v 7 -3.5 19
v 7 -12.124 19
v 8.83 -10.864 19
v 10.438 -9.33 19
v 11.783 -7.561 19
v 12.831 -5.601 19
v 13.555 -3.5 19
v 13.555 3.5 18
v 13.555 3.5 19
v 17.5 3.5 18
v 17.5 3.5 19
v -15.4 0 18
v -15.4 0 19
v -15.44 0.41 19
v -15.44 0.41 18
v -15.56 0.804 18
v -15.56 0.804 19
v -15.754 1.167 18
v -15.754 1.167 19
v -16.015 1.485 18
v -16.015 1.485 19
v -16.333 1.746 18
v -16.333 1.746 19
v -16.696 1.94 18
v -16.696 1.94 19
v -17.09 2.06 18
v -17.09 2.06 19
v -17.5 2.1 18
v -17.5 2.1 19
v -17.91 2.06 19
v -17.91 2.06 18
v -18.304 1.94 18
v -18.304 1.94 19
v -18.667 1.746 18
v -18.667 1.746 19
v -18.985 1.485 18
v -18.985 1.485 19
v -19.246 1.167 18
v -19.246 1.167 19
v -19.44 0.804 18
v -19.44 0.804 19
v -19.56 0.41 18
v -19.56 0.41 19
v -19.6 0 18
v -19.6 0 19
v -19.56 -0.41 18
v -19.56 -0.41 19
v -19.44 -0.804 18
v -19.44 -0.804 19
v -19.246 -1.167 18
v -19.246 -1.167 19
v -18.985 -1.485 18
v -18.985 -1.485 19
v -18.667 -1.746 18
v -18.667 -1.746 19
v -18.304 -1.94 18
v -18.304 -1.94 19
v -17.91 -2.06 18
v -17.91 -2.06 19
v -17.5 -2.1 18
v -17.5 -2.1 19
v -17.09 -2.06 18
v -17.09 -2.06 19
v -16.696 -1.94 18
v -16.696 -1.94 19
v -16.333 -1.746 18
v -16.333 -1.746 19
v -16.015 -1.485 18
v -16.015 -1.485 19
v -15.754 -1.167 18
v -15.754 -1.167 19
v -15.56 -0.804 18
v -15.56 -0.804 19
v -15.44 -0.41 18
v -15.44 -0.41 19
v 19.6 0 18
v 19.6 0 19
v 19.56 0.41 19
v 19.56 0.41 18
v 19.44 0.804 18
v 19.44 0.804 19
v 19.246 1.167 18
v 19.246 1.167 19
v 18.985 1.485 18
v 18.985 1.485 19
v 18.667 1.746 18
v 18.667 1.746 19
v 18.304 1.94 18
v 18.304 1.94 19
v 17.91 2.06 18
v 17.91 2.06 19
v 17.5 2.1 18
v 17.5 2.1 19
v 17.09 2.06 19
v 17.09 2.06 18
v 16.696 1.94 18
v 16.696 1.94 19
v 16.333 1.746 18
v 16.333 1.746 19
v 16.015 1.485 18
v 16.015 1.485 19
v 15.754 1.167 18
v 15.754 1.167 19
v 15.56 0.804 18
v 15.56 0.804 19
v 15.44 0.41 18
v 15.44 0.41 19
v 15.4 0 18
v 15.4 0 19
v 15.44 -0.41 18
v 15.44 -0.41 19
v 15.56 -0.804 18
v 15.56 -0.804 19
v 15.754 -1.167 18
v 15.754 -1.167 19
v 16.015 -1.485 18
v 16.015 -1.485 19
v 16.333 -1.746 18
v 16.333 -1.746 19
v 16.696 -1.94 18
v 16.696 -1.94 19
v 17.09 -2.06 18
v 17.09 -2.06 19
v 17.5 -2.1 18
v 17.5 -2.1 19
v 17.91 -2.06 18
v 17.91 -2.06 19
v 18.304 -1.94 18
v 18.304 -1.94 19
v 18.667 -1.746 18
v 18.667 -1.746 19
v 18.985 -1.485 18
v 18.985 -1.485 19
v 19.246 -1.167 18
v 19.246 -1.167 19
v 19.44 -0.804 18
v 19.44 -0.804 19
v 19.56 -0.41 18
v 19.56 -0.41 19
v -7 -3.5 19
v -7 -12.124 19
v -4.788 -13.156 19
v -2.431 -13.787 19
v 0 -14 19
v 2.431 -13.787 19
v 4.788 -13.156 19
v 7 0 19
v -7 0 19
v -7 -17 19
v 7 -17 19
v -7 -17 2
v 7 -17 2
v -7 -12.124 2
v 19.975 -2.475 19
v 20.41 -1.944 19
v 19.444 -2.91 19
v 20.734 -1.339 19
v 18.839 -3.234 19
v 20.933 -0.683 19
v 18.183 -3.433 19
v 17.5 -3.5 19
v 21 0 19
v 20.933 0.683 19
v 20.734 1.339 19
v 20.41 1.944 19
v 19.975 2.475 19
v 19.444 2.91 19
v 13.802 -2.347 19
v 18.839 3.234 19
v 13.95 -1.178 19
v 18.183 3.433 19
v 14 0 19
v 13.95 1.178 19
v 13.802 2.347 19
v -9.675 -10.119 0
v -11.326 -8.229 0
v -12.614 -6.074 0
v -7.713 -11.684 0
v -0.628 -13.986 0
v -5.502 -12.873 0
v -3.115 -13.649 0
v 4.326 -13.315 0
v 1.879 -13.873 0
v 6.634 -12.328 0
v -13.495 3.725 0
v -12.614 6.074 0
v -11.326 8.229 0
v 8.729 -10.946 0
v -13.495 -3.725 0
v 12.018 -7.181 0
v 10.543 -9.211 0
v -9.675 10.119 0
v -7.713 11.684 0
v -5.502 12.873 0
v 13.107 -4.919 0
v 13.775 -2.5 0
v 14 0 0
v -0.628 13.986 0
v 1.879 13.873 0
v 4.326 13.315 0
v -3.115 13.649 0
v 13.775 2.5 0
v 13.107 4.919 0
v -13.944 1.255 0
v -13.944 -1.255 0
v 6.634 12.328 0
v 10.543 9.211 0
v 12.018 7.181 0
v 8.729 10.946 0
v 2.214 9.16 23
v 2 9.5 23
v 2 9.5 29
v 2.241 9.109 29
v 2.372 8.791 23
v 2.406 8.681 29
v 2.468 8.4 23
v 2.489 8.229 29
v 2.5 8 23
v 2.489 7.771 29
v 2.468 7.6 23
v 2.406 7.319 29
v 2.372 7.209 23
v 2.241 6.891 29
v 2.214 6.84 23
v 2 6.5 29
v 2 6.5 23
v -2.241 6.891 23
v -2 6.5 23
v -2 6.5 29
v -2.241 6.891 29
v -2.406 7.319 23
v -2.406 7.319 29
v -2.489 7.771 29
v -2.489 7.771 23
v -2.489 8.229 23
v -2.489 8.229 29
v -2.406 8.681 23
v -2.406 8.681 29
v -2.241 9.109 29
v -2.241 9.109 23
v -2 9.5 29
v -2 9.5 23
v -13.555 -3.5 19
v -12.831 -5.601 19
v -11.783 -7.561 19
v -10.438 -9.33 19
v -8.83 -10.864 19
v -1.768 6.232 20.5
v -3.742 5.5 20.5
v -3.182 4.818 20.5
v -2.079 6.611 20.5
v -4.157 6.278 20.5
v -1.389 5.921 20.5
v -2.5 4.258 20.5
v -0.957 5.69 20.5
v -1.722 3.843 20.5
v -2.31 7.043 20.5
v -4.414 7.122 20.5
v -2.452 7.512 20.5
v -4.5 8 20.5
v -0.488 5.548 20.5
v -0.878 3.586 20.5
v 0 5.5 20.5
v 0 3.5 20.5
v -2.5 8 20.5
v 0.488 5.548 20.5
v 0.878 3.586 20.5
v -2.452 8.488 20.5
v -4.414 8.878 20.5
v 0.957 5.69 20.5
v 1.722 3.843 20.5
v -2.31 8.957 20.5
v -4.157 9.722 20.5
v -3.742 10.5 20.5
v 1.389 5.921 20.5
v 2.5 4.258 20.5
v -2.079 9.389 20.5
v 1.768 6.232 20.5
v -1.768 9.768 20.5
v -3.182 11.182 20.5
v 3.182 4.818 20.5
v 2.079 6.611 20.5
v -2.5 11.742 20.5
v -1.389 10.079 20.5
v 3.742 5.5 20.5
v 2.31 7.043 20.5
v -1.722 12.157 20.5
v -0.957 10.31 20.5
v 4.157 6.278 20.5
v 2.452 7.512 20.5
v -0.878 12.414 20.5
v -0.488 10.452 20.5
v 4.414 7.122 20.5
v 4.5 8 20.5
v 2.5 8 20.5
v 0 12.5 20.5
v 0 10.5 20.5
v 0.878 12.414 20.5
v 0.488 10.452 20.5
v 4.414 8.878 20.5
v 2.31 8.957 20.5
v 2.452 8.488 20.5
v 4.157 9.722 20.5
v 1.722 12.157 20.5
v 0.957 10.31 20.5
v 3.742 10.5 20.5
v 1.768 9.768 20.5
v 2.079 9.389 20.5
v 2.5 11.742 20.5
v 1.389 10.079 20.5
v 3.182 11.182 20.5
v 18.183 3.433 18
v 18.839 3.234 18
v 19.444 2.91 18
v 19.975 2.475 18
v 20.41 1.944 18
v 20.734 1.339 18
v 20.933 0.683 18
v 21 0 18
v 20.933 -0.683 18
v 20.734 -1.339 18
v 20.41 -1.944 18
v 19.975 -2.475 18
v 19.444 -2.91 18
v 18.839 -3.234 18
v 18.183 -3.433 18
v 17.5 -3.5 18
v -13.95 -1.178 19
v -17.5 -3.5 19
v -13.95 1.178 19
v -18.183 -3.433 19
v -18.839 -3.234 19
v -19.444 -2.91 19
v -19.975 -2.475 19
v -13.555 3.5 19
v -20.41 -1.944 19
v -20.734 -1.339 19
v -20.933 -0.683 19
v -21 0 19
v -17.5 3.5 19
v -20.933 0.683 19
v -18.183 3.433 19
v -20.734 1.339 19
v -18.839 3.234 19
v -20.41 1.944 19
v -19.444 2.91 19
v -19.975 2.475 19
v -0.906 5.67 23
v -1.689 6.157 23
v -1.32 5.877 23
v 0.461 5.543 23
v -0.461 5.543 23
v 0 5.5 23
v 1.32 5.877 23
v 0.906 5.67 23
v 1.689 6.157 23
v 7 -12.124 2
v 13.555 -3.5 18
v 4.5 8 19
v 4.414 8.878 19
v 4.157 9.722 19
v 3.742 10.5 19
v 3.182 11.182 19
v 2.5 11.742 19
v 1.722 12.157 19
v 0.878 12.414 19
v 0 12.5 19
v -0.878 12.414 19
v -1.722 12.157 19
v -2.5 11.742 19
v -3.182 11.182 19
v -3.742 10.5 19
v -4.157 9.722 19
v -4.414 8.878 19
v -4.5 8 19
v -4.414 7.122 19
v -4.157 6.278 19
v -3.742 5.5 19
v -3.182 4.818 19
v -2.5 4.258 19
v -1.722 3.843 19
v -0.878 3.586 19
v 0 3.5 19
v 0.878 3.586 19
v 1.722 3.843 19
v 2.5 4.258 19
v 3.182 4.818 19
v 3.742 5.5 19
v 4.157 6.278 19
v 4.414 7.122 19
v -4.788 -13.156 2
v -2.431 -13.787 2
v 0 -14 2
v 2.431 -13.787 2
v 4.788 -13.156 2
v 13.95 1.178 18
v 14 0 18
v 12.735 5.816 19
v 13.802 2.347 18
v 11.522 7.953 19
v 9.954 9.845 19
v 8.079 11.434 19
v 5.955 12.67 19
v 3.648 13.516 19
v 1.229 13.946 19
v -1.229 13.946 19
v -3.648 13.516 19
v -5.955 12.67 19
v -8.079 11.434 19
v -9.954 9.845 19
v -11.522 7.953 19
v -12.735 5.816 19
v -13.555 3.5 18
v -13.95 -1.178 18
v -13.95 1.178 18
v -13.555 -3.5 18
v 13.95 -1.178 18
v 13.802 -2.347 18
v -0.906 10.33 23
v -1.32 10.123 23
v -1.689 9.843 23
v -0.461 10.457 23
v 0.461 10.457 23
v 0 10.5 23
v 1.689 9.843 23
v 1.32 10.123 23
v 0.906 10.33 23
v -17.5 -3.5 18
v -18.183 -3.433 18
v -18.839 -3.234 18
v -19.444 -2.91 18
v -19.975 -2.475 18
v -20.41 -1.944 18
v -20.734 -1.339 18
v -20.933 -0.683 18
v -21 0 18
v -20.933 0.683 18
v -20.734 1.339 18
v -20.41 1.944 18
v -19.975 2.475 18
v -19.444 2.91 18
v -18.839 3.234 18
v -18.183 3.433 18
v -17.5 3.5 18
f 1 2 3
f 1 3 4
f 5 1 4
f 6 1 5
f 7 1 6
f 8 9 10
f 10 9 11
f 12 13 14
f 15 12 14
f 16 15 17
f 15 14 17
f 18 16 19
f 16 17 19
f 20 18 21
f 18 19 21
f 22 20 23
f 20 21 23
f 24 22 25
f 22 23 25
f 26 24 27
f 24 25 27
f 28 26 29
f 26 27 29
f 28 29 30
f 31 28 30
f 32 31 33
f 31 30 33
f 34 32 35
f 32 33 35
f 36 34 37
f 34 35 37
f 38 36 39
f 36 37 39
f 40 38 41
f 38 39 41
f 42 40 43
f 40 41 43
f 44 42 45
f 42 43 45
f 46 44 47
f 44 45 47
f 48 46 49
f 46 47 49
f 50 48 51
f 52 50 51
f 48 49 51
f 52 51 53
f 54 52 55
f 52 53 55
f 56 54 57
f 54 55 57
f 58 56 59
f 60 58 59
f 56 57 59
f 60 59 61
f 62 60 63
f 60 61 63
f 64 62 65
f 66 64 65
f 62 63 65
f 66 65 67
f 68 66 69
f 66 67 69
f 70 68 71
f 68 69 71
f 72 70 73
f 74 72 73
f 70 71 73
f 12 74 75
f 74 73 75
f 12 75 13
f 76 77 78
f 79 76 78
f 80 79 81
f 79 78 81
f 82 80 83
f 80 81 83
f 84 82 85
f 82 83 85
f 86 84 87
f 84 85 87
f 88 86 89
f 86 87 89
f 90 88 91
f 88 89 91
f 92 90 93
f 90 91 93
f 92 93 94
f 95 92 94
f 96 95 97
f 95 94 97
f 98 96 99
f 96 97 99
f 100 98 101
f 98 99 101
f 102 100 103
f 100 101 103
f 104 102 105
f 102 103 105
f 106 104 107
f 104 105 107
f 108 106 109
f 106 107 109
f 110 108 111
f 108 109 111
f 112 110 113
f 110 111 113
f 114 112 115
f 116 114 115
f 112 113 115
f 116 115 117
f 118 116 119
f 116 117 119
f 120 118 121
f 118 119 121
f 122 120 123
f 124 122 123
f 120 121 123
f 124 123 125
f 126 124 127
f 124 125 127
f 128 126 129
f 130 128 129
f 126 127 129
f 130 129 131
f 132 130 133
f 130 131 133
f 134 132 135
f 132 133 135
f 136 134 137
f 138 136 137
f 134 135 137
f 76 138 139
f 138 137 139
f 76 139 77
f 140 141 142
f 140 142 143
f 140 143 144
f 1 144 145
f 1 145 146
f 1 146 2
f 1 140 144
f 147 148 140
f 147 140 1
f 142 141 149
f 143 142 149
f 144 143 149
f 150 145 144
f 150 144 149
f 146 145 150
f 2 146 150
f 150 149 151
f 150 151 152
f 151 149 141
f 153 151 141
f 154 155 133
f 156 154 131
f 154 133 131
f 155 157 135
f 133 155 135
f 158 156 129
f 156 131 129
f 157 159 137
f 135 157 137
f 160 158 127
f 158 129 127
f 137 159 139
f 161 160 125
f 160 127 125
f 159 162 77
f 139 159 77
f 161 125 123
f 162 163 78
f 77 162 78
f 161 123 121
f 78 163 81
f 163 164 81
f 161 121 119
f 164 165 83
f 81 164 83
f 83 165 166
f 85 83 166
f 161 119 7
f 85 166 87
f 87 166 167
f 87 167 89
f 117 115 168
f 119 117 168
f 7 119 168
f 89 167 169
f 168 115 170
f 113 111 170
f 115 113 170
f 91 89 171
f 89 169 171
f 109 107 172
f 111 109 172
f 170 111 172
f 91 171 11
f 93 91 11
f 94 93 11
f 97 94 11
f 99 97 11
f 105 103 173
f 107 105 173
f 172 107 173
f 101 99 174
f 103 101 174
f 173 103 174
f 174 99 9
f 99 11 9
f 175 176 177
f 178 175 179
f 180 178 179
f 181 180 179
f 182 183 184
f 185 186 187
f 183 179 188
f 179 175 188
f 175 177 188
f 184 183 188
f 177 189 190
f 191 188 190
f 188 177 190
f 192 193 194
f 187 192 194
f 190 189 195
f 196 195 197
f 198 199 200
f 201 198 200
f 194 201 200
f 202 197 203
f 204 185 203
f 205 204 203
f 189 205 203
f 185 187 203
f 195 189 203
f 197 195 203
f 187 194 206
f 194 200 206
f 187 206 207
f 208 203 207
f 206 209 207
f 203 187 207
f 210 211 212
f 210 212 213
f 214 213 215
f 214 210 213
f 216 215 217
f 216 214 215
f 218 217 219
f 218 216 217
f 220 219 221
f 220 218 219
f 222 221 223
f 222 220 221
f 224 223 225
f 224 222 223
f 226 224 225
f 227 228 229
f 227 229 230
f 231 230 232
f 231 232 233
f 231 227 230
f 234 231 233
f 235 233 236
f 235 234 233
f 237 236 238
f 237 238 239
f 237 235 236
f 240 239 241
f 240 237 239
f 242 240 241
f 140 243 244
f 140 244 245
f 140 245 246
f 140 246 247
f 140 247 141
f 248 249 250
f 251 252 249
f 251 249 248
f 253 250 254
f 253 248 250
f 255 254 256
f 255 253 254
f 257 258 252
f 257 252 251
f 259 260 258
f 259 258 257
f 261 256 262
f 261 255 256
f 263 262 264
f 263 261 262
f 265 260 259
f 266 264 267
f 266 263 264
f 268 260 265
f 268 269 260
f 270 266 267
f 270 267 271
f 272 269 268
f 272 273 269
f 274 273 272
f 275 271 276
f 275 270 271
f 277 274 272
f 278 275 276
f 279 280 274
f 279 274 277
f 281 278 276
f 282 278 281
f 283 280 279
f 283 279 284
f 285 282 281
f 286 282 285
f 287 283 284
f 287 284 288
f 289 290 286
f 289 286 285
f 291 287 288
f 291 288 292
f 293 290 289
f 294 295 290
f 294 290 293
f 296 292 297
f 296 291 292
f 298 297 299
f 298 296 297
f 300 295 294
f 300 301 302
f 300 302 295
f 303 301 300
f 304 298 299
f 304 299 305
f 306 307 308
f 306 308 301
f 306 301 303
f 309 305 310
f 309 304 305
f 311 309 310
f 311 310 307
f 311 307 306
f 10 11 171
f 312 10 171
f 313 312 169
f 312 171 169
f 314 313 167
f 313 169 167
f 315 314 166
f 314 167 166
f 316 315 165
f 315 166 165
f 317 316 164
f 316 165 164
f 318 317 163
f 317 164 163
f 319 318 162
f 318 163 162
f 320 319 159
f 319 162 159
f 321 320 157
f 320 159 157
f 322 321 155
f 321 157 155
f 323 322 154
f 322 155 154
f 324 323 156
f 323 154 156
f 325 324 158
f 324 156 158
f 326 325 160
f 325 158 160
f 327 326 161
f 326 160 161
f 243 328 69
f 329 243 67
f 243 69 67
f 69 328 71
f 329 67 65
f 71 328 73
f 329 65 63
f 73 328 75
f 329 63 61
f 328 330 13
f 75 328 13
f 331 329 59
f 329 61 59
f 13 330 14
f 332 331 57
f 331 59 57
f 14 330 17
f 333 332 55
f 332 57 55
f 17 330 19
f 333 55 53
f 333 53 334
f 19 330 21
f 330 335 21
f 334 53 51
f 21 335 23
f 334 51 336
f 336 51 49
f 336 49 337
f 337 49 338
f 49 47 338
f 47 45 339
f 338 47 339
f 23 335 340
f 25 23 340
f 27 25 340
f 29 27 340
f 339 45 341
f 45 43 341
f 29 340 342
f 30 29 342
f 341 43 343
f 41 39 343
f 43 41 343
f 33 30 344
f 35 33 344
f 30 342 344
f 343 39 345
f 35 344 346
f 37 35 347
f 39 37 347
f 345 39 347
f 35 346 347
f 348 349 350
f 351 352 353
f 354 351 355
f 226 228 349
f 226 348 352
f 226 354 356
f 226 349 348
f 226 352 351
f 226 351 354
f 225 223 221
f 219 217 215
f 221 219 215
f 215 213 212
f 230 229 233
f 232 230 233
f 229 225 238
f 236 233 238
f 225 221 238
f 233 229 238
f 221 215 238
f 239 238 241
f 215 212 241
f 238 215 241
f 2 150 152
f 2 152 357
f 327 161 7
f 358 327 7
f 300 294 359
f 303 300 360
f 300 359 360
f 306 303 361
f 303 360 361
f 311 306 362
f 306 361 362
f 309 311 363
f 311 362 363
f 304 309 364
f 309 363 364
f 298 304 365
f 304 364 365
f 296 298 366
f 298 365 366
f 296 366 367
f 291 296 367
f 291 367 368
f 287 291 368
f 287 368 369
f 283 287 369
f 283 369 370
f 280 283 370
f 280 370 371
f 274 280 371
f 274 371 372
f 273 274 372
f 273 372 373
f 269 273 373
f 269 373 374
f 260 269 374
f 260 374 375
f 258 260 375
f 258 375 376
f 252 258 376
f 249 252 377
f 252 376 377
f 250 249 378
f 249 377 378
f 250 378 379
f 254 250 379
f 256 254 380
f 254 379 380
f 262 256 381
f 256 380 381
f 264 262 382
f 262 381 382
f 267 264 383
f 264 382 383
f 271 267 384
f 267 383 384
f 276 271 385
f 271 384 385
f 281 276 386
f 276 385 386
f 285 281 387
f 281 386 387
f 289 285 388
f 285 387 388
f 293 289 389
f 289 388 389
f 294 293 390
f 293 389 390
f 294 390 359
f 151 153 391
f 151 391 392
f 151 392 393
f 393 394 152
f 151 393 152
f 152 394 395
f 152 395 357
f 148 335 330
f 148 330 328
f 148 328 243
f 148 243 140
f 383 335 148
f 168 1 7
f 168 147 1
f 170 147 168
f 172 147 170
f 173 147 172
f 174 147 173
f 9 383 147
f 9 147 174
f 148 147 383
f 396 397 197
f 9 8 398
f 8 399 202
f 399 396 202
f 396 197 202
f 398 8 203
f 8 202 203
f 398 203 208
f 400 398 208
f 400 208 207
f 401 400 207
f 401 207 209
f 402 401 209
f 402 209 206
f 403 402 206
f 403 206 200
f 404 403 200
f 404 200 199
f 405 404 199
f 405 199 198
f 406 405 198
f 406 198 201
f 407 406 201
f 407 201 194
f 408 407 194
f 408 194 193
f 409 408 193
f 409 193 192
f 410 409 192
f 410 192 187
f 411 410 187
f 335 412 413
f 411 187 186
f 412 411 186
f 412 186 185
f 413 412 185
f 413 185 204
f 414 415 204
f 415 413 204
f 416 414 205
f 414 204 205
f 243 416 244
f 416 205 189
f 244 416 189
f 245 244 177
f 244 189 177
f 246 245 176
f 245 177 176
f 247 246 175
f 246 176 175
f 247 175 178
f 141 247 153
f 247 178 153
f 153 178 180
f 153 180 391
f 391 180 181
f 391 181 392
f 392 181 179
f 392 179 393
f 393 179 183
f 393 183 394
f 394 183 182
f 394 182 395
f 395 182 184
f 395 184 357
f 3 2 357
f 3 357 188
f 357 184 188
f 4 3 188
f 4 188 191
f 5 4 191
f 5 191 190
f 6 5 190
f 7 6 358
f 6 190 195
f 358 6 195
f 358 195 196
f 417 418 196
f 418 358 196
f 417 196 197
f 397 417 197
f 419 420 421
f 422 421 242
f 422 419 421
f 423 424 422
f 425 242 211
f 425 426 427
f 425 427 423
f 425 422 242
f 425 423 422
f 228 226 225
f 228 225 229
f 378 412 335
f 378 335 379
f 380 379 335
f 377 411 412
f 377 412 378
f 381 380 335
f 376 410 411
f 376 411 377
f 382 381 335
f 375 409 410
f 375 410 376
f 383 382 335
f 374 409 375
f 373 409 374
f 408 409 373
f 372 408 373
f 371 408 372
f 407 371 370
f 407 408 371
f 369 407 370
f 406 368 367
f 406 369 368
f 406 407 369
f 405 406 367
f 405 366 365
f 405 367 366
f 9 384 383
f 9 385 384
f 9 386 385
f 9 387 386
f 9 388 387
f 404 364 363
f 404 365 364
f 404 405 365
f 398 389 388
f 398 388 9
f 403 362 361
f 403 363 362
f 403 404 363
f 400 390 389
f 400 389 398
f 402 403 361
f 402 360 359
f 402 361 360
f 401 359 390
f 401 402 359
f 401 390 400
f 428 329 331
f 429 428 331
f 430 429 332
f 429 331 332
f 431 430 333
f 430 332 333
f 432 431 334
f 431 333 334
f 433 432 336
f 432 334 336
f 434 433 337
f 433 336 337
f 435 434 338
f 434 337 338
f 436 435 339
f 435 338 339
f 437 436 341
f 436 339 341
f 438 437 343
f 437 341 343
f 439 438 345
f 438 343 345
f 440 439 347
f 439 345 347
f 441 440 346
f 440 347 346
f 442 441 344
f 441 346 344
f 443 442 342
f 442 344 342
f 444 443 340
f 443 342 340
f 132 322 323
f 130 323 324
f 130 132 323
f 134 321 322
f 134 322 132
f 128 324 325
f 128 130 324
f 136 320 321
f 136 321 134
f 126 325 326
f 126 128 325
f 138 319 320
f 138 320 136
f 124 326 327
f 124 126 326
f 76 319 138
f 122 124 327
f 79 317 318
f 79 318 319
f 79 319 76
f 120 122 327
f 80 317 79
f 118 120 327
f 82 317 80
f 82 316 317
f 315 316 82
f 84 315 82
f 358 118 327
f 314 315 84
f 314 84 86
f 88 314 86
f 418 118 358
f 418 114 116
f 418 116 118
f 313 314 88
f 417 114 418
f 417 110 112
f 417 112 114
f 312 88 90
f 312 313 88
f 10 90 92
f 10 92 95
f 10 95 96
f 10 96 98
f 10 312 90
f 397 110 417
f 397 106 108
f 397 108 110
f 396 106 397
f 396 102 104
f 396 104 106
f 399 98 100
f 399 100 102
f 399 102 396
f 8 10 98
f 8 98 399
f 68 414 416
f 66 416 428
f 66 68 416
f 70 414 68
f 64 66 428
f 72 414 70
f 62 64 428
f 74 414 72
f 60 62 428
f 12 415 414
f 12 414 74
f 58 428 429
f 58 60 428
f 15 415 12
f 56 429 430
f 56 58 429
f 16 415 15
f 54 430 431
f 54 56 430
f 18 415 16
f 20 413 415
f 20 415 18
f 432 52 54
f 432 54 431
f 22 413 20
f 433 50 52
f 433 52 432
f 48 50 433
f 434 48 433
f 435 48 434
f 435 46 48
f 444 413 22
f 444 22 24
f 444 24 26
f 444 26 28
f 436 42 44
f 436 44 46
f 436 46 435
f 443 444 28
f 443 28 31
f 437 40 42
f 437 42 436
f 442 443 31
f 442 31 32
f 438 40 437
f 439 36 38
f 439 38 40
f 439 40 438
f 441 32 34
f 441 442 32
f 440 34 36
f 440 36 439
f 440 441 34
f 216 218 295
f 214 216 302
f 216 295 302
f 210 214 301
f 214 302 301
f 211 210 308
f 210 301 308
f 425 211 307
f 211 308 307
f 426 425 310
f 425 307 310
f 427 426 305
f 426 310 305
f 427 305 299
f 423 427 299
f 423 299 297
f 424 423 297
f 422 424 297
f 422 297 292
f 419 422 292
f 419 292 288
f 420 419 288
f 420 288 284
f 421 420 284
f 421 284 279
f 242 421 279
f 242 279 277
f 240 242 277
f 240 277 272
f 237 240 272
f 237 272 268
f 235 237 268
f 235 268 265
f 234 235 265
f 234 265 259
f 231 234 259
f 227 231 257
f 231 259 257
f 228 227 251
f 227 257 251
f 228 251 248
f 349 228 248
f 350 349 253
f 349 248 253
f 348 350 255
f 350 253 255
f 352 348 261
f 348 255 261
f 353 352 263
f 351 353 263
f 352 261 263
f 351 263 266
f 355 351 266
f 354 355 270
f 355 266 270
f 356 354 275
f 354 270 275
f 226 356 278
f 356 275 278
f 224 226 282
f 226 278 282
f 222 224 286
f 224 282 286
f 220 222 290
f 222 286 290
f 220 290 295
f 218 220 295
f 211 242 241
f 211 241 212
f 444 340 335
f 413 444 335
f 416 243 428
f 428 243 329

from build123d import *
from build123d.topology import SkipClean

# Parameters (mm, degrees)
SKETCH2_R           = 14
BOSS_EXTRUDE1_DEPTH = 19
SKETCH3_R           = 2.5
BOSS_EXTRUDE2_DEPTH = 4
SKETCH3_3_R         = 4.5
BOSS_EXTRUDE3_DEPTH = 1.5
BOSS_EXTRUDE4_DEPTH = 6
SKETCH6_W           = 14
SKETCH6_H           = 17
BOSS_EXTRUDE5_DEPTH = 17
SKETCH7_R           = 2.1
BOSS_EXTRUDE6_DEPTH = 1


with BuildPart() as part:
    # Sketch2 → Boss-Extrude1 (new body)
    with BuildSketch(Plane.XY):
        Circle(SKETCH2_R)
    extrude(amount=BOSS_EXTRUDE1_DEPTH)

    # Sketch3 → Boss-Extrude2 (add)
    with BuildSketch(Plane.XY.offset(19)):
        with Locations((0, 8)):
            Circle(SKETCH3_R)
    extrude(amount=BOSS_EXTRUDE2_DEPTH)

    # Sketch3<3> → Boss-Extrude3 (add)
    with BuildSketch(Plane.XY.offset(19)):
        with Locations((0, 8)):
            Circle(SKETCH3_3_R)
    extrude(amount=BOSS_EXTRUDE3_DEPTH)

    # Sketch4 → Boss-Extrude4 (add)
    with SkipClean():  # the faces are left unmerged after this step: merging them gives an invalid solid
        with BuildSketch(Plane.XY.offset(23)):
            with BuildLine():
                Line((-2, 9.5), (2, 9.5))
                ThreePointArc((2, 9.5), (2.5, 8), (2, 6.5))
                Line((2, 6.5), (-2, 6.5))
                ThreePointArc((-2, 6.5), (-2.5, 8), (-2, 9.5))
            make_face()
        extrude(amount=BOSS_EXTRUDE4_DEPTH)

    # Sketch6 → Boss-Extrude5 (add)
    with SkipClean():  # the faces are left unmerged after this step: merging them gives an invalid solid
        with BuildSketch(Plane.XY.offset(19)):
            with Locations((0, -8.5)):
                Rectangle(SKETCH6_W, SKETCH6_H)
        extrude(amount=-BOSS_EXTRUDE5_DEPTH)

    # Sketch7 → Boss-Extrude6 (add)
    with SkipClean():  # the faces are left unmerged after this step: merging them gives an invalid solid
        with BuildSketch(Plane.XY.offset(19)):
            with BuildLine():
                Line((-17.5, 3.5), (17.5, 3.5))
                ThreePointArc((17.5, 3.5), (21, 0), (17.5, -3.5))
                Line((17.5, -3.5), (-17.5, -3.5))
                ThreePointArc((-17.5, -3.5), (-21, 0), (-17.5, 3.5))
            make_face()
            with Locations((-17.5, 0)):
                Circle(SKETCH7_R, mode=Mode.SUBTRACT)
            with Locations((17.5, 0)):
                Circle(SKETCH7_R, mode=Mode.SUBTRACT)
        extrude(amount=-BOSS_EXTRUDE6_DEPTH)


solid = part.part
